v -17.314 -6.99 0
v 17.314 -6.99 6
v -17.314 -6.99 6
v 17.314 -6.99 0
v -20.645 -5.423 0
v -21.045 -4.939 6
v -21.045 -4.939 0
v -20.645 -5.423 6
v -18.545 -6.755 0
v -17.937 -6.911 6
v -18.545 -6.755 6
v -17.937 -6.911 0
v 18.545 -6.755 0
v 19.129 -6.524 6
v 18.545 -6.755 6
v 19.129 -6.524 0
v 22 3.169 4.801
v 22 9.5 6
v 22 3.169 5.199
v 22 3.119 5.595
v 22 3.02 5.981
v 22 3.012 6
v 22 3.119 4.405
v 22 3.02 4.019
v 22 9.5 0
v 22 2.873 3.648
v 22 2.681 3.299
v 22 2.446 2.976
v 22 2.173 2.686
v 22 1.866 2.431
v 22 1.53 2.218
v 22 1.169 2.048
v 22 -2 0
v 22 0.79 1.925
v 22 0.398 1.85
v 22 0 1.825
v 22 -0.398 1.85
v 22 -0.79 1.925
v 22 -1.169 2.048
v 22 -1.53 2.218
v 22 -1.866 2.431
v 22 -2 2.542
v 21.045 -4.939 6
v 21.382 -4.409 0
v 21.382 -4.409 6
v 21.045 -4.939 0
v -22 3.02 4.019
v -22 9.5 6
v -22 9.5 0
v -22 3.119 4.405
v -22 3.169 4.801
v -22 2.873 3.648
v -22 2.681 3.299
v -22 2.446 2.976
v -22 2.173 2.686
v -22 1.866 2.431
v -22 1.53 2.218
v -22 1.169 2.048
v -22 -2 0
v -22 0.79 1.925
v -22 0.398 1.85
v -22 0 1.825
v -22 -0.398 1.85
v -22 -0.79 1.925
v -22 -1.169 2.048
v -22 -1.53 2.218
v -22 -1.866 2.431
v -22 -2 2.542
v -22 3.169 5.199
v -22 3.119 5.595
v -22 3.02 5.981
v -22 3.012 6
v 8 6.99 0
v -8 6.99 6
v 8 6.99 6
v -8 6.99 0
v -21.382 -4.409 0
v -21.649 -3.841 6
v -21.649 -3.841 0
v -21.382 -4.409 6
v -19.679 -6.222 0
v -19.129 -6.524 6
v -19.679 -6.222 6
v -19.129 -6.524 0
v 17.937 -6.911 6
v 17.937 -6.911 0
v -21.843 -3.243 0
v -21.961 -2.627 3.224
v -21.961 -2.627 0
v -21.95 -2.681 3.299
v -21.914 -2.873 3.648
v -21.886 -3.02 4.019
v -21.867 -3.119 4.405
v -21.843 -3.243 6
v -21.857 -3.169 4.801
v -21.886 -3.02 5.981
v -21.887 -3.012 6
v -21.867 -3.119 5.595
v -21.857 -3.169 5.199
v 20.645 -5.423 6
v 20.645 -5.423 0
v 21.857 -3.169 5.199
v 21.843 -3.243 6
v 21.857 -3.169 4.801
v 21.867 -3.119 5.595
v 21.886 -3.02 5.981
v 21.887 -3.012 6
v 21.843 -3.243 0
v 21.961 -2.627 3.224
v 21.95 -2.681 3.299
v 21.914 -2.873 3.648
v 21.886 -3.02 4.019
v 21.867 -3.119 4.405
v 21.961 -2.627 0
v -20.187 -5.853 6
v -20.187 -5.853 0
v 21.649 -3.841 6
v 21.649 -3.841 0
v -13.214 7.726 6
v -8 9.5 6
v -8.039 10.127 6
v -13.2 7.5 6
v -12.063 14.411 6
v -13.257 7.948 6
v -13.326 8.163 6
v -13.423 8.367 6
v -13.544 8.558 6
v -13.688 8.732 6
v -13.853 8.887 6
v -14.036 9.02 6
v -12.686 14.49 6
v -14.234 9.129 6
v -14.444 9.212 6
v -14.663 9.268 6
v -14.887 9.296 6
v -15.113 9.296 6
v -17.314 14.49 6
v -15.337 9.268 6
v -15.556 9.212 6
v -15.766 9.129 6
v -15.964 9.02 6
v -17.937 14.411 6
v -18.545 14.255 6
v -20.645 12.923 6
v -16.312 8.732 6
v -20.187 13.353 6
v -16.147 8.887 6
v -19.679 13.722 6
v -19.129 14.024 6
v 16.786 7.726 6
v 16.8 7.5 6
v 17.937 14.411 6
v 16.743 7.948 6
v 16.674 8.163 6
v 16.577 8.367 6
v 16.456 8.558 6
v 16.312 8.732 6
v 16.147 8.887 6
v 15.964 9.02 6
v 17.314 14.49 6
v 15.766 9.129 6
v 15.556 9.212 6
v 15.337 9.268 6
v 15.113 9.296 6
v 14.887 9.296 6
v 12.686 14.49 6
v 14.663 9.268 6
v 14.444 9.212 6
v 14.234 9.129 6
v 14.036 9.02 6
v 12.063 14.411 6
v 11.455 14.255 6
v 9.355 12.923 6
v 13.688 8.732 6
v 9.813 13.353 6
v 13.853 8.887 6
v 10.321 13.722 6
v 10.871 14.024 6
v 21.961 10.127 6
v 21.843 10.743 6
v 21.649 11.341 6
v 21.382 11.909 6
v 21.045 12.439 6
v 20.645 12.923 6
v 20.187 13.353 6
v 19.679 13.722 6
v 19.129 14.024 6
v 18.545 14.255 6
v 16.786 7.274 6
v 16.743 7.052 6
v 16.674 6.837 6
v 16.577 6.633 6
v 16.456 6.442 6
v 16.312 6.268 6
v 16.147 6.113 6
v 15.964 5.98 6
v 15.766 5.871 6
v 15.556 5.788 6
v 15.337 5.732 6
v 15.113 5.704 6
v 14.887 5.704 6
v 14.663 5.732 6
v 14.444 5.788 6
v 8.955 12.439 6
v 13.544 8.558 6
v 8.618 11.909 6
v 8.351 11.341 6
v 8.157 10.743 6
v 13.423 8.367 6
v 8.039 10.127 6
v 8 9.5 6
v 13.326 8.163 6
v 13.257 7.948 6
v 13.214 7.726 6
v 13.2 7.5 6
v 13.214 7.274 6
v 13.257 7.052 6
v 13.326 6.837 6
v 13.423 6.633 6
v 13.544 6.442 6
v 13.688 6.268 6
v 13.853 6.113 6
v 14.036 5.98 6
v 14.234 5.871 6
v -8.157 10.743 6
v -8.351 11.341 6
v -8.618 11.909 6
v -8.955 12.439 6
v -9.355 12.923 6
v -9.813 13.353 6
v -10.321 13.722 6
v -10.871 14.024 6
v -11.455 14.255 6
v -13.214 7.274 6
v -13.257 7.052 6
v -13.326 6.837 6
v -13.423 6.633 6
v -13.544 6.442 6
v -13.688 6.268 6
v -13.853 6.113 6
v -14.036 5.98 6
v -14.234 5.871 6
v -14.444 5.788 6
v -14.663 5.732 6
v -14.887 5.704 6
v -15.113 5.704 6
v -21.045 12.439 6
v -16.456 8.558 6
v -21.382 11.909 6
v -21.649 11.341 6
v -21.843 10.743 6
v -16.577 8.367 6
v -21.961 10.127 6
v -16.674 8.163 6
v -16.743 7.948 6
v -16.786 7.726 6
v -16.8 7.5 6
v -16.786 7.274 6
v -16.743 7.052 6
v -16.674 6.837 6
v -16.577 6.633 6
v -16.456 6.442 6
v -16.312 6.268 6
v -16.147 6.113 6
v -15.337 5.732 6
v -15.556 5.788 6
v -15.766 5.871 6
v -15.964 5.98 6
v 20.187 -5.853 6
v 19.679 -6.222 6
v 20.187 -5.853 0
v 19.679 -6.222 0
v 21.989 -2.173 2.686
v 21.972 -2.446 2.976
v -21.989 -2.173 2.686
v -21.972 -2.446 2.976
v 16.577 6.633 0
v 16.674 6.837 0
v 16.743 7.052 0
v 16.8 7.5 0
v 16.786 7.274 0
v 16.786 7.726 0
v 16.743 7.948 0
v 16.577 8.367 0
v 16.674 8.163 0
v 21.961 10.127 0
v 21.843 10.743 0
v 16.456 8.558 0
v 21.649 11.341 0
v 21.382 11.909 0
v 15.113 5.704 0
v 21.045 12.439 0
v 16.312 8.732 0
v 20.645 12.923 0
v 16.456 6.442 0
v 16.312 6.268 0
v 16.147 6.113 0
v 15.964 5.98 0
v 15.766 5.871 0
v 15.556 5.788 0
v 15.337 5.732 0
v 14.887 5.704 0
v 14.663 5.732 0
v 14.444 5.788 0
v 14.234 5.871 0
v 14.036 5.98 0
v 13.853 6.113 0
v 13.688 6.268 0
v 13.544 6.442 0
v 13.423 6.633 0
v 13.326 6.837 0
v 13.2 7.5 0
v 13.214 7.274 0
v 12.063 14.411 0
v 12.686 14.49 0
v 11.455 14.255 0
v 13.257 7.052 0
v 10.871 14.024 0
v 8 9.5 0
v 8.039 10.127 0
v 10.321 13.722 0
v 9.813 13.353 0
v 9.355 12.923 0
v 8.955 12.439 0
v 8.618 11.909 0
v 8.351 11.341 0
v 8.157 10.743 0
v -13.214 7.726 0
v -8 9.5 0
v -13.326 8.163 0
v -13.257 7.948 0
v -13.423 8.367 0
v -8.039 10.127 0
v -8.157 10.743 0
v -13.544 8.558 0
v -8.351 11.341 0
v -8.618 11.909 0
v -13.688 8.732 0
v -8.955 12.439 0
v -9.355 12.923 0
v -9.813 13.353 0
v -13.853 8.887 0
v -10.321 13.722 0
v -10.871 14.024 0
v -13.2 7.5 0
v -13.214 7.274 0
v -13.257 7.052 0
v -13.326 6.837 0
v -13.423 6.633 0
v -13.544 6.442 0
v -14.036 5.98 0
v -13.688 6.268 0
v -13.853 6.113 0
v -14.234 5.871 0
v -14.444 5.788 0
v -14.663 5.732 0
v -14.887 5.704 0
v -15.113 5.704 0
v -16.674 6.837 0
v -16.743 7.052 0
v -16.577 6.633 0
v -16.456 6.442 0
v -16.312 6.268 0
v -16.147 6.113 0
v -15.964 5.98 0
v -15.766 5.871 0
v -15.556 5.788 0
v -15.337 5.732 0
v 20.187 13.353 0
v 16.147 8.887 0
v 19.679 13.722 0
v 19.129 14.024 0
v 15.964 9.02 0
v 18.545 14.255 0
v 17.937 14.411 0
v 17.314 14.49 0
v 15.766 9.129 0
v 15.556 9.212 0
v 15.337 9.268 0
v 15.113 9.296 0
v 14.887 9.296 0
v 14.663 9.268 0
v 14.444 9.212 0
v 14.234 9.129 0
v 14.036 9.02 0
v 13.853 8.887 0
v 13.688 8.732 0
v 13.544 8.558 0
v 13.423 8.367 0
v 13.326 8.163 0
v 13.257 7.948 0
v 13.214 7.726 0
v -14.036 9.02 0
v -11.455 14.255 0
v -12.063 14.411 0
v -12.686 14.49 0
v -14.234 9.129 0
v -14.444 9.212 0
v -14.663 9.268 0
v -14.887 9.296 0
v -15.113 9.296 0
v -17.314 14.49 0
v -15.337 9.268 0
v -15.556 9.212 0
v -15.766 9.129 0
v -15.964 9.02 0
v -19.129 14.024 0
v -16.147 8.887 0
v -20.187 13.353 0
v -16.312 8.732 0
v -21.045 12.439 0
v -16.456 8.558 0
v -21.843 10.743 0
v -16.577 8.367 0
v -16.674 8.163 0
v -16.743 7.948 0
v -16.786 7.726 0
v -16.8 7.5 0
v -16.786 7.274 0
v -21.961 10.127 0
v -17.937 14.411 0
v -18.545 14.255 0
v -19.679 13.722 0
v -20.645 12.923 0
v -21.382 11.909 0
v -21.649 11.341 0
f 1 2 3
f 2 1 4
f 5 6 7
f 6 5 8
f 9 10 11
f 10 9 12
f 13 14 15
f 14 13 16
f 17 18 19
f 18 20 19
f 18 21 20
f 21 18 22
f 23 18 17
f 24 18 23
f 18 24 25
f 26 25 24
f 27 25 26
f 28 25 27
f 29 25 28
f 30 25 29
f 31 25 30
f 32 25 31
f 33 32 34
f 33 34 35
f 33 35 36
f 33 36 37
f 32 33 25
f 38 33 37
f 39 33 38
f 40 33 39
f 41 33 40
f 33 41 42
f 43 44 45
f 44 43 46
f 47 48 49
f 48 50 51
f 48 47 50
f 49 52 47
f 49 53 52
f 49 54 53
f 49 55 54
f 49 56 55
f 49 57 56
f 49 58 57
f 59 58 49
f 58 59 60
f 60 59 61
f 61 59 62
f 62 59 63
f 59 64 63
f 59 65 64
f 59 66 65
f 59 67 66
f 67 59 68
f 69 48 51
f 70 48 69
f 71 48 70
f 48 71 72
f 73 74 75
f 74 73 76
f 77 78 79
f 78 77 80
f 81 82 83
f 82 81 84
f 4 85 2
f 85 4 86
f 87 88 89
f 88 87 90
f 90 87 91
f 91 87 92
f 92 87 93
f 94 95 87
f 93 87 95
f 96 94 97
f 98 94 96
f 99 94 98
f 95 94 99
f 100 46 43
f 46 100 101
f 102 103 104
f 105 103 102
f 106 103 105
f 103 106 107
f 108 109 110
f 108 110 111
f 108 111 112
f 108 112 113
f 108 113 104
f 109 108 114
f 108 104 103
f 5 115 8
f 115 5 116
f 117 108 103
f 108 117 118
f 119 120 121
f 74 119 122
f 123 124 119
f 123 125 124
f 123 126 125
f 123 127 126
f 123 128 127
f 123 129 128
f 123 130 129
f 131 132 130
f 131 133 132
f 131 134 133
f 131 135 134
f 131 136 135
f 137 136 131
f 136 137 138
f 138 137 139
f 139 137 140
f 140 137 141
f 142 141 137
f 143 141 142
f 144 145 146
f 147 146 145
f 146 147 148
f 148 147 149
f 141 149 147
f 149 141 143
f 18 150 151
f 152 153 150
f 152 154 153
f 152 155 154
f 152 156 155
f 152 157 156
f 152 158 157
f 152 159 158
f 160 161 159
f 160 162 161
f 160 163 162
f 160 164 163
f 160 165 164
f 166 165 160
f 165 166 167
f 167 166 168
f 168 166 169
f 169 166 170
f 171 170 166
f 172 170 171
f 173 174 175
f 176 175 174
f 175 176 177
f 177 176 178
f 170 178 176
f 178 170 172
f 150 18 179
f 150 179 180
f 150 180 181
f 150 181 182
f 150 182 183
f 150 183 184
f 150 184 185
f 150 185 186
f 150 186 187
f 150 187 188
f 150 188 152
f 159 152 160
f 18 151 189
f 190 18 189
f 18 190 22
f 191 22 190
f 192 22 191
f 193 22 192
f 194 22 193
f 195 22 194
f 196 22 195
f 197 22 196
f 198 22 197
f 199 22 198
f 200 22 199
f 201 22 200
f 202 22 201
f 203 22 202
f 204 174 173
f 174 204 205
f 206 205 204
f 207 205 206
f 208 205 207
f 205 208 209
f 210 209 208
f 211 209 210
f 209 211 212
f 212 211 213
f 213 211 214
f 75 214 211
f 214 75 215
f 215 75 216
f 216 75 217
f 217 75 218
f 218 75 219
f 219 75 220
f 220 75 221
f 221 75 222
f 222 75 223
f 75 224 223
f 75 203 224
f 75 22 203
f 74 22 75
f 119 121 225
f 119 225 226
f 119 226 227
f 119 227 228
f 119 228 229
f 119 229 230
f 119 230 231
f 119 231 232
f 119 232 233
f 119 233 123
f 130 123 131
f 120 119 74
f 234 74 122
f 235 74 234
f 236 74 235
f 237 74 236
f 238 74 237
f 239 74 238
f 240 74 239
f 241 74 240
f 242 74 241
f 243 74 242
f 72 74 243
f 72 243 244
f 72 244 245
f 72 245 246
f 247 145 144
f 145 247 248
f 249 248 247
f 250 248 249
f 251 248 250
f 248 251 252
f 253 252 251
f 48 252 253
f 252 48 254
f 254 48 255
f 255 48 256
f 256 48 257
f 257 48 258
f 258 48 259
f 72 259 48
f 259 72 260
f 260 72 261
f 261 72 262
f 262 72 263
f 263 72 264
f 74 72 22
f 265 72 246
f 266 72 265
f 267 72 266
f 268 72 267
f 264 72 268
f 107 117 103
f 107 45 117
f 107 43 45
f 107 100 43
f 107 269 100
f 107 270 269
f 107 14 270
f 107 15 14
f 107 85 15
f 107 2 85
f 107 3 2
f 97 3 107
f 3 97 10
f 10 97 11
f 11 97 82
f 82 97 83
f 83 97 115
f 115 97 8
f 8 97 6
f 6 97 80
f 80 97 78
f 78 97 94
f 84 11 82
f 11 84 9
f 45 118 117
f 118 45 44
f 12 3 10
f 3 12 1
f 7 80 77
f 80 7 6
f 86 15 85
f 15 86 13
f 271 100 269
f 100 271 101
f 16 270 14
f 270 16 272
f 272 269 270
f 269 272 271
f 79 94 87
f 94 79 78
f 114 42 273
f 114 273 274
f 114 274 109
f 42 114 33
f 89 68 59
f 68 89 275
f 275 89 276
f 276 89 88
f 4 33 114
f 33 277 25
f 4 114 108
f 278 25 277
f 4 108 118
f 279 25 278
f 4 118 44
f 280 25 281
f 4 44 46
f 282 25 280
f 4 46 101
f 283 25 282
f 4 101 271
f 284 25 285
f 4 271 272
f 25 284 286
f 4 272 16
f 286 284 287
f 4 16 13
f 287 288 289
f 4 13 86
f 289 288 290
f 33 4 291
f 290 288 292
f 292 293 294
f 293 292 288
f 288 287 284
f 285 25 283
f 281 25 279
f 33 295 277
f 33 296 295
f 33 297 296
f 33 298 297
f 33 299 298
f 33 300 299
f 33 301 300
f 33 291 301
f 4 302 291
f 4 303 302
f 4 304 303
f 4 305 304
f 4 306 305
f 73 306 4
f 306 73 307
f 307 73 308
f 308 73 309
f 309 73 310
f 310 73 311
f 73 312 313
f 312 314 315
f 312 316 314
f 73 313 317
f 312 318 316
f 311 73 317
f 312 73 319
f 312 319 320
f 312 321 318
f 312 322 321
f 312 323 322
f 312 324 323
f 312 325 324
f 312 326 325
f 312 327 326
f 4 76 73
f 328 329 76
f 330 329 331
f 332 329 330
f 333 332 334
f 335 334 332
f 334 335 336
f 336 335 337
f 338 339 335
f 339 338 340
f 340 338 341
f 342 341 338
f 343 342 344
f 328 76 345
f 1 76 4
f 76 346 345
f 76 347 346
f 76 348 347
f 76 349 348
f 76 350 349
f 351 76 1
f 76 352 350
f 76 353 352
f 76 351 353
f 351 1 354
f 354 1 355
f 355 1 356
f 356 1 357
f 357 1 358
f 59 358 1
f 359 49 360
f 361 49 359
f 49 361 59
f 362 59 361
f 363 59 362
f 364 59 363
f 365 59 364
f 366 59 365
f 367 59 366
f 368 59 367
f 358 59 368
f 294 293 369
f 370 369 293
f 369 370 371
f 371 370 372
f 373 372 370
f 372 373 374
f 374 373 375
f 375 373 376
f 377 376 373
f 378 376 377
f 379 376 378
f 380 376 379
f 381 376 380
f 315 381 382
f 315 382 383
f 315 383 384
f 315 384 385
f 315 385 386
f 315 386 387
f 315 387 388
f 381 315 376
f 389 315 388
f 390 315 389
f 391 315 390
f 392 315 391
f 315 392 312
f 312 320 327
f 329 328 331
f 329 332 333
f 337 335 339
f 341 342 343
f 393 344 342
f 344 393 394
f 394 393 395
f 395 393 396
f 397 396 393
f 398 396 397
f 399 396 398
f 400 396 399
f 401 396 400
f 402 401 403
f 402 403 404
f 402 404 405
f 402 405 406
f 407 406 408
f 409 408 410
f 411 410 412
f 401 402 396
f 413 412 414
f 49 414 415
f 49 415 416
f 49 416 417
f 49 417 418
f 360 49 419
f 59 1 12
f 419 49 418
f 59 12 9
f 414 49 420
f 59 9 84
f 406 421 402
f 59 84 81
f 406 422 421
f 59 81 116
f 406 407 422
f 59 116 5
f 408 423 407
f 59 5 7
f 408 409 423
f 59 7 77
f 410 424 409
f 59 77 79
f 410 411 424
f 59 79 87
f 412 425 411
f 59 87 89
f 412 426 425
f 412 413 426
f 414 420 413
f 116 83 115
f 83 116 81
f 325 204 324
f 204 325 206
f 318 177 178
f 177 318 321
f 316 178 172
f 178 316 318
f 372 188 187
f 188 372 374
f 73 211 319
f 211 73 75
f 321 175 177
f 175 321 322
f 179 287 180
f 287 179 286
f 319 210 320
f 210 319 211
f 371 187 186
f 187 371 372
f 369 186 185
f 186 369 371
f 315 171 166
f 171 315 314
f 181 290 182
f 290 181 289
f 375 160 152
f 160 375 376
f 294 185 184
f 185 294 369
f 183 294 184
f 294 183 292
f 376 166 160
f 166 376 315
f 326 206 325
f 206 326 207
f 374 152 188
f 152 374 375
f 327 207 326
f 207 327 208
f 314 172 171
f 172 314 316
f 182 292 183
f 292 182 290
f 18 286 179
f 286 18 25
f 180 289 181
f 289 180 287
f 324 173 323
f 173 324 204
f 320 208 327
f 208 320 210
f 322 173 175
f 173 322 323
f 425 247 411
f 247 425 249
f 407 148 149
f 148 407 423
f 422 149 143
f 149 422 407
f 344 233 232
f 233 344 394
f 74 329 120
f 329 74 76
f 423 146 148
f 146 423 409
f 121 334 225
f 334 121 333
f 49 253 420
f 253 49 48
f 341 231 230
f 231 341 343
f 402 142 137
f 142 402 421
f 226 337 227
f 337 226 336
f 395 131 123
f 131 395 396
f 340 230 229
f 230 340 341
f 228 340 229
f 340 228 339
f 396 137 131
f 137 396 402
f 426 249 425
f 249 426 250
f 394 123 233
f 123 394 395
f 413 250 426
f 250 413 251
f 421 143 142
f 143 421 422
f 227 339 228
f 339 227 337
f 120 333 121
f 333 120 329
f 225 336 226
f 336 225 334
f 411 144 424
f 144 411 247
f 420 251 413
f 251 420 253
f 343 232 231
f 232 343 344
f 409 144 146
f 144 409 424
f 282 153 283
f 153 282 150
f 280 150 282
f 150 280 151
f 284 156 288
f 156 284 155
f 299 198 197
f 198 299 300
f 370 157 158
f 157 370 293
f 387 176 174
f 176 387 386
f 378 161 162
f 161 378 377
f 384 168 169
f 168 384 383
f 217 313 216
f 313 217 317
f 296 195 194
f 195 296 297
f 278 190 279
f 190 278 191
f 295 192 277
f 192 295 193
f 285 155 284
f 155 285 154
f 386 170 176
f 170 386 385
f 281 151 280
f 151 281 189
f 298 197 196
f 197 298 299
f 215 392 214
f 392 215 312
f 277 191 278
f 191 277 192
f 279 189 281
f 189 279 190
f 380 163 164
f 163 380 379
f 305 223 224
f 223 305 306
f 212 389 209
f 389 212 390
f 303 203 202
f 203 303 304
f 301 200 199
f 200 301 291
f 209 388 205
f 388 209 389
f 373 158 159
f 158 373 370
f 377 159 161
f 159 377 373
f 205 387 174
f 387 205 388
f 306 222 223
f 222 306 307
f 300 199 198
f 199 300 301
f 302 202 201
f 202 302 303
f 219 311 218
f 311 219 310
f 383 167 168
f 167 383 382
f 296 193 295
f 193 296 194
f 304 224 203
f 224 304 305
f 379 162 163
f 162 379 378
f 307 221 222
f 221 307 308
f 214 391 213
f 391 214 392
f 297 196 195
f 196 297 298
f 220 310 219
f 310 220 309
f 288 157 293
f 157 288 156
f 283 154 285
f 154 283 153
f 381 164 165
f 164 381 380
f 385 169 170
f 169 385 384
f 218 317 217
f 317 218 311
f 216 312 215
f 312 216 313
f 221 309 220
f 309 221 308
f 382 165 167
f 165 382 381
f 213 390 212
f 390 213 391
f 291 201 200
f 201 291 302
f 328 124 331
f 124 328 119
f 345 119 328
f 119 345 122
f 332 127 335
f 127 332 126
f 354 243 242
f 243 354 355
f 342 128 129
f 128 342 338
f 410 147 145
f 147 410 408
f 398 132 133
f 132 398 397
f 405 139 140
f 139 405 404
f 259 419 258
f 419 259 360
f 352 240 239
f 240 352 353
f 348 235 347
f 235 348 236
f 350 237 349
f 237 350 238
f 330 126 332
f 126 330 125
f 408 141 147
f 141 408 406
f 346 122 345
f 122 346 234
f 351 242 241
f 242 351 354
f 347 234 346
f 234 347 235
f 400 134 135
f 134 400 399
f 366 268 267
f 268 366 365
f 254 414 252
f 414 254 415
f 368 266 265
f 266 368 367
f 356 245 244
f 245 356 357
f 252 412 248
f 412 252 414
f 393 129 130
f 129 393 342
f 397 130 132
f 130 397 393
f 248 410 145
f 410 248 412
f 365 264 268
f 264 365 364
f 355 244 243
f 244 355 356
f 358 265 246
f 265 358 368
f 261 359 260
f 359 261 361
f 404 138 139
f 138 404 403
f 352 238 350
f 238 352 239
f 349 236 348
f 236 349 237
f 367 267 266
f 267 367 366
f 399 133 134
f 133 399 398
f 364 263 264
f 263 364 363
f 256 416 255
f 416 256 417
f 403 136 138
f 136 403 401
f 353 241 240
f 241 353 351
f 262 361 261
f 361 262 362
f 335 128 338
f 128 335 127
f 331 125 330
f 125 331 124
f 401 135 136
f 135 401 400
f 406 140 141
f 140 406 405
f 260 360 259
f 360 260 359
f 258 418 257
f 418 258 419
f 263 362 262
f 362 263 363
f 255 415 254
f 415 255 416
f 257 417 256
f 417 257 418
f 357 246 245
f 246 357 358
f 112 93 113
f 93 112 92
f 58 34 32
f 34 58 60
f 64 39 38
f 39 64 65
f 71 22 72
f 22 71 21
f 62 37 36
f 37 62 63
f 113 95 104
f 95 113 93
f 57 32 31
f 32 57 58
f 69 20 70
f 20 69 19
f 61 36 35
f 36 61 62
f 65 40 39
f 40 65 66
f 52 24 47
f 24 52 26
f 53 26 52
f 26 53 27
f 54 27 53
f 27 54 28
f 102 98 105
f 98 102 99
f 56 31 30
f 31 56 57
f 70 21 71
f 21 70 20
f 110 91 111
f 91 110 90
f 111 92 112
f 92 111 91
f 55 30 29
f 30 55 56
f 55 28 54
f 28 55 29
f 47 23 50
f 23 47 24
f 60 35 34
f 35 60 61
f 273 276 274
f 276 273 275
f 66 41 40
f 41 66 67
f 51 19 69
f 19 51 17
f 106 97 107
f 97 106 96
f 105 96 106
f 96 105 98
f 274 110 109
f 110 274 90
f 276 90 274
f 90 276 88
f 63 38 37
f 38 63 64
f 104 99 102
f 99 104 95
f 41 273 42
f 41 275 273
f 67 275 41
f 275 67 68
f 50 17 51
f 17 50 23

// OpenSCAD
$fn = 50;


difference() {
	union() {
		hull() {
			translate(v = [-17.0000000000, 2.0000000000, 0]) {
				cylinder(h = 6, r = 5);
			}
			translate(v = [17.0000000000, 2.0000000000, 0]) {
				cylinder(h = 6, r = 5);
			}
			translate(v = [-17.0000000000, -2.0000000000, 0]) {
				cylinder(h = 6, r = 5);
			}
			translate(v = [17.0000000000, -2.0000000000, 0]) {
				cylinder(h = 6, r = 5);
			}
		}
		translate(v = [15.0000000000, 3.7500000000, 0]) {
			hull() {
				translate(v = [-2.0000000000, 5.7500000000, 0]) {
					cylinder(h = 6, r = 5);
				}
				translate(v = [2.0000000000, 5.7500000000, 0]) {
					cylinder(h = 6, r = 5);
				}
				translate(v = [-2.0000000000, -5.7500000000, 0]) {
					cylinder(h = 6, r = 5);
				}
				translate(v = [2.0000000000, -5.7500000000, 0]) {
					cylinder(h = 6, r = 5);
				}
			}
		}
		translate(v = [-15.0000000000, 3.7500000000, 0]) {
			hull() {
				translate(v = [-2.0000000000, 5.7500000000, 0]) {
					cylinder(h = 6, r = 5);
				}
				translate(v = [2.0000000000, 5.7500000000, 0]) {
					cylinder(h = 6, r = 5);
				}
				translate(v = [-2.0000000000, -5.7500000000, 0]) {
					cylinder(h = 6, r = 5);
				}
				translate(v = [2.0000000000, -5.7500000000, 0]) {
					cylinder(h = 6, r = 5);
				}
			}
		}
	}
	union() {
		#translate(v = [15.0000000000, 7.5000000000, 0]) {
			cylinder(h = 6, r = 1.8000000000);
		}
		#translate(v = [-15.0000000000, 7.5000000000, 0]) {
			cylinder(h = 6, r = 1.8000000000);
		}
		translate(v = [-22.5000000000, 0, 5.0000000000]) {
			rotate(a = [0, 90, 0]) {
				cylinder(h = 45, r = 3.1750000000);
			}
		}
	}
}
